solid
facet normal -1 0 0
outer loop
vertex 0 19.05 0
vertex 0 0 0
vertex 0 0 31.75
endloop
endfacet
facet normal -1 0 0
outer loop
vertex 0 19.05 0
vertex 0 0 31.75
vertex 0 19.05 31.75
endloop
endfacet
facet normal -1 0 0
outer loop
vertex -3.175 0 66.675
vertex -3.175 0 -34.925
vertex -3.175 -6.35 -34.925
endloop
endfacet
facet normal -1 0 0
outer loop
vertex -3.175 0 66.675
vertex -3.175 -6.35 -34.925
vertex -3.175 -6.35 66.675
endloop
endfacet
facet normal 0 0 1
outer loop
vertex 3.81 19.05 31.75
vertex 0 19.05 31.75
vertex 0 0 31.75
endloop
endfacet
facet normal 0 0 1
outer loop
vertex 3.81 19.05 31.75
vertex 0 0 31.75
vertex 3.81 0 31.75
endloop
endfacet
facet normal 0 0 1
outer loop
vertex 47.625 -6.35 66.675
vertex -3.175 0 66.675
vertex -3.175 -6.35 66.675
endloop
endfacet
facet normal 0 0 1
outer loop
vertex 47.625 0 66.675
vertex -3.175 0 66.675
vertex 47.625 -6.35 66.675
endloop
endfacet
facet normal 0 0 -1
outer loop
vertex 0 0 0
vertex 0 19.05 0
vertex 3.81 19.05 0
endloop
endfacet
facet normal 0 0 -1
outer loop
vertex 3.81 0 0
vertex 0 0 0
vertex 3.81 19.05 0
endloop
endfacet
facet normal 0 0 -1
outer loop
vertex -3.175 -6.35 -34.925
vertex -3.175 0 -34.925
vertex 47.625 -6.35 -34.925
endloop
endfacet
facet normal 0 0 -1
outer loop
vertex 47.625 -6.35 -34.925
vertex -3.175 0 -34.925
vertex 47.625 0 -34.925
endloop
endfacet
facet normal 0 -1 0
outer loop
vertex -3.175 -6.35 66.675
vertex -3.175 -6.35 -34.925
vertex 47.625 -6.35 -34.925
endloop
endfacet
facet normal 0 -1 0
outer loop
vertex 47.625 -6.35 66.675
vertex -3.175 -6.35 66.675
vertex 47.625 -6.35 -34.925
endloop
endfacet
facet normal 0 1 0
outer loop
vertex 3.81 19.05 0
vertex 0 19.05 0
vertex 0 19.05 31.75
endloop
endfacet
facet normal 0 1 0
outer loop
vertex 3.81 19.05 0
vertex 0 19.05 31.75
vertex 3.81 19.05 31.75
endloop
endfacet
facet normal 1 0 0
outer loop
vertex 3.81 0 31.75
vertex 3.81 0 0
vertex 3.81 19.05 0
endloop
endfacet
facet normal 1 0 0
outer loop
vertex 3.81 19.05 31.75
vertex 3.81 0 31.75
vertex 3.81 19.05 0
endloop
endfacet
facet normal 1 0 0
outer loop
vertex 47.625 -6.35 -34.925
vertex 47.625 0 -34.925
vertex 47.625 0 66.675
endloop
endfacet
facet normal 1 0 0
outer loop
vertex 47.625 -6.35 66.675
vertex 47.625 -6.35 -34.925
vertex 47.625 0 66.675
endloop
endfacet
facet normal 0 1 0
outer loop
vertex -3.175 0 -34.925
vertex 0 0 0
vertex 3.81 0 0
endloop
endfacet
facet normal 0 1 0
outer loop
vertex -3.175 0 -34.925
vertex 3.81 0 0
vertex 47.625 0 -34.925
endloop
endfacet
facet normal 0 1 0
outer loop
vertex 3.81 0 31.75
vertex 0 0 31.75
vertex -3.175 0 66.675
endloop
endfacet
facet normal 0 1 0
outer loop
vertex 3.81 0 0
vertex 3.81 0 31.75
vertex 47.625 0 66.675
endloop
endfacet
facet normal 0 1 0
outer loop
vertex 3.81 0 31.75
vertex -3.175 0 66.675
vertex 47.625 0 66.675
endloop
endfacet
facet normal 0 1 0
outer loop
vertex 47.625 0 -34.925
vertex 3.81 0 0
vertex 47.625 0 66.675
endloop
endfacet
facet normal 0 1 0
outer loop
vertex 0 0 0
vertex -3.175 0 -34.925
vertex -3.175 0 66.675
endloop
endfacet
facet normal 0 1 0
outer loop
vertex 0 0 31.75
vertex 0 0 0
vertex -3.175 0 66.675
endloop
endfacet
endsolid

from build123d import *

# Parameters (mm, degrees)
F0_W     = 3.81
F0_H     = 19.05
F1_DEPTH = 31.75
F2_W     = 50.8
F2_H     = 101.6
F2_W_2   = 3.81
F2_H_2   = 31.75
F3_DEPTH = 6.35


with BuildPart() as f1:
    # F0 (on Top) → F1 (new body)
    with BuildSketch(Plane.XY):
        with Locations((1.905, 9.525)):
            Rectangle(F0_W, F0_H)
    extrude(amount=F1_DEPTH)

    # F2 (on face) → F3 (join)
    with BuildSketch(Plane.XZ):
        with Locations((22.225, 15.875)):
            Rectangle(F2_W, F2_H)
        with Locations((1.905, 15.875)):
            Rectangle(F2_W_2, F2_H_2, mode=Mode.SUBTRACT)
        with Locations((1.905, 15.875)):
            Rectangle(F2_W_2, F2_H_2)
    extrude(amount=F3_DEPTH)


solid = f1.part
